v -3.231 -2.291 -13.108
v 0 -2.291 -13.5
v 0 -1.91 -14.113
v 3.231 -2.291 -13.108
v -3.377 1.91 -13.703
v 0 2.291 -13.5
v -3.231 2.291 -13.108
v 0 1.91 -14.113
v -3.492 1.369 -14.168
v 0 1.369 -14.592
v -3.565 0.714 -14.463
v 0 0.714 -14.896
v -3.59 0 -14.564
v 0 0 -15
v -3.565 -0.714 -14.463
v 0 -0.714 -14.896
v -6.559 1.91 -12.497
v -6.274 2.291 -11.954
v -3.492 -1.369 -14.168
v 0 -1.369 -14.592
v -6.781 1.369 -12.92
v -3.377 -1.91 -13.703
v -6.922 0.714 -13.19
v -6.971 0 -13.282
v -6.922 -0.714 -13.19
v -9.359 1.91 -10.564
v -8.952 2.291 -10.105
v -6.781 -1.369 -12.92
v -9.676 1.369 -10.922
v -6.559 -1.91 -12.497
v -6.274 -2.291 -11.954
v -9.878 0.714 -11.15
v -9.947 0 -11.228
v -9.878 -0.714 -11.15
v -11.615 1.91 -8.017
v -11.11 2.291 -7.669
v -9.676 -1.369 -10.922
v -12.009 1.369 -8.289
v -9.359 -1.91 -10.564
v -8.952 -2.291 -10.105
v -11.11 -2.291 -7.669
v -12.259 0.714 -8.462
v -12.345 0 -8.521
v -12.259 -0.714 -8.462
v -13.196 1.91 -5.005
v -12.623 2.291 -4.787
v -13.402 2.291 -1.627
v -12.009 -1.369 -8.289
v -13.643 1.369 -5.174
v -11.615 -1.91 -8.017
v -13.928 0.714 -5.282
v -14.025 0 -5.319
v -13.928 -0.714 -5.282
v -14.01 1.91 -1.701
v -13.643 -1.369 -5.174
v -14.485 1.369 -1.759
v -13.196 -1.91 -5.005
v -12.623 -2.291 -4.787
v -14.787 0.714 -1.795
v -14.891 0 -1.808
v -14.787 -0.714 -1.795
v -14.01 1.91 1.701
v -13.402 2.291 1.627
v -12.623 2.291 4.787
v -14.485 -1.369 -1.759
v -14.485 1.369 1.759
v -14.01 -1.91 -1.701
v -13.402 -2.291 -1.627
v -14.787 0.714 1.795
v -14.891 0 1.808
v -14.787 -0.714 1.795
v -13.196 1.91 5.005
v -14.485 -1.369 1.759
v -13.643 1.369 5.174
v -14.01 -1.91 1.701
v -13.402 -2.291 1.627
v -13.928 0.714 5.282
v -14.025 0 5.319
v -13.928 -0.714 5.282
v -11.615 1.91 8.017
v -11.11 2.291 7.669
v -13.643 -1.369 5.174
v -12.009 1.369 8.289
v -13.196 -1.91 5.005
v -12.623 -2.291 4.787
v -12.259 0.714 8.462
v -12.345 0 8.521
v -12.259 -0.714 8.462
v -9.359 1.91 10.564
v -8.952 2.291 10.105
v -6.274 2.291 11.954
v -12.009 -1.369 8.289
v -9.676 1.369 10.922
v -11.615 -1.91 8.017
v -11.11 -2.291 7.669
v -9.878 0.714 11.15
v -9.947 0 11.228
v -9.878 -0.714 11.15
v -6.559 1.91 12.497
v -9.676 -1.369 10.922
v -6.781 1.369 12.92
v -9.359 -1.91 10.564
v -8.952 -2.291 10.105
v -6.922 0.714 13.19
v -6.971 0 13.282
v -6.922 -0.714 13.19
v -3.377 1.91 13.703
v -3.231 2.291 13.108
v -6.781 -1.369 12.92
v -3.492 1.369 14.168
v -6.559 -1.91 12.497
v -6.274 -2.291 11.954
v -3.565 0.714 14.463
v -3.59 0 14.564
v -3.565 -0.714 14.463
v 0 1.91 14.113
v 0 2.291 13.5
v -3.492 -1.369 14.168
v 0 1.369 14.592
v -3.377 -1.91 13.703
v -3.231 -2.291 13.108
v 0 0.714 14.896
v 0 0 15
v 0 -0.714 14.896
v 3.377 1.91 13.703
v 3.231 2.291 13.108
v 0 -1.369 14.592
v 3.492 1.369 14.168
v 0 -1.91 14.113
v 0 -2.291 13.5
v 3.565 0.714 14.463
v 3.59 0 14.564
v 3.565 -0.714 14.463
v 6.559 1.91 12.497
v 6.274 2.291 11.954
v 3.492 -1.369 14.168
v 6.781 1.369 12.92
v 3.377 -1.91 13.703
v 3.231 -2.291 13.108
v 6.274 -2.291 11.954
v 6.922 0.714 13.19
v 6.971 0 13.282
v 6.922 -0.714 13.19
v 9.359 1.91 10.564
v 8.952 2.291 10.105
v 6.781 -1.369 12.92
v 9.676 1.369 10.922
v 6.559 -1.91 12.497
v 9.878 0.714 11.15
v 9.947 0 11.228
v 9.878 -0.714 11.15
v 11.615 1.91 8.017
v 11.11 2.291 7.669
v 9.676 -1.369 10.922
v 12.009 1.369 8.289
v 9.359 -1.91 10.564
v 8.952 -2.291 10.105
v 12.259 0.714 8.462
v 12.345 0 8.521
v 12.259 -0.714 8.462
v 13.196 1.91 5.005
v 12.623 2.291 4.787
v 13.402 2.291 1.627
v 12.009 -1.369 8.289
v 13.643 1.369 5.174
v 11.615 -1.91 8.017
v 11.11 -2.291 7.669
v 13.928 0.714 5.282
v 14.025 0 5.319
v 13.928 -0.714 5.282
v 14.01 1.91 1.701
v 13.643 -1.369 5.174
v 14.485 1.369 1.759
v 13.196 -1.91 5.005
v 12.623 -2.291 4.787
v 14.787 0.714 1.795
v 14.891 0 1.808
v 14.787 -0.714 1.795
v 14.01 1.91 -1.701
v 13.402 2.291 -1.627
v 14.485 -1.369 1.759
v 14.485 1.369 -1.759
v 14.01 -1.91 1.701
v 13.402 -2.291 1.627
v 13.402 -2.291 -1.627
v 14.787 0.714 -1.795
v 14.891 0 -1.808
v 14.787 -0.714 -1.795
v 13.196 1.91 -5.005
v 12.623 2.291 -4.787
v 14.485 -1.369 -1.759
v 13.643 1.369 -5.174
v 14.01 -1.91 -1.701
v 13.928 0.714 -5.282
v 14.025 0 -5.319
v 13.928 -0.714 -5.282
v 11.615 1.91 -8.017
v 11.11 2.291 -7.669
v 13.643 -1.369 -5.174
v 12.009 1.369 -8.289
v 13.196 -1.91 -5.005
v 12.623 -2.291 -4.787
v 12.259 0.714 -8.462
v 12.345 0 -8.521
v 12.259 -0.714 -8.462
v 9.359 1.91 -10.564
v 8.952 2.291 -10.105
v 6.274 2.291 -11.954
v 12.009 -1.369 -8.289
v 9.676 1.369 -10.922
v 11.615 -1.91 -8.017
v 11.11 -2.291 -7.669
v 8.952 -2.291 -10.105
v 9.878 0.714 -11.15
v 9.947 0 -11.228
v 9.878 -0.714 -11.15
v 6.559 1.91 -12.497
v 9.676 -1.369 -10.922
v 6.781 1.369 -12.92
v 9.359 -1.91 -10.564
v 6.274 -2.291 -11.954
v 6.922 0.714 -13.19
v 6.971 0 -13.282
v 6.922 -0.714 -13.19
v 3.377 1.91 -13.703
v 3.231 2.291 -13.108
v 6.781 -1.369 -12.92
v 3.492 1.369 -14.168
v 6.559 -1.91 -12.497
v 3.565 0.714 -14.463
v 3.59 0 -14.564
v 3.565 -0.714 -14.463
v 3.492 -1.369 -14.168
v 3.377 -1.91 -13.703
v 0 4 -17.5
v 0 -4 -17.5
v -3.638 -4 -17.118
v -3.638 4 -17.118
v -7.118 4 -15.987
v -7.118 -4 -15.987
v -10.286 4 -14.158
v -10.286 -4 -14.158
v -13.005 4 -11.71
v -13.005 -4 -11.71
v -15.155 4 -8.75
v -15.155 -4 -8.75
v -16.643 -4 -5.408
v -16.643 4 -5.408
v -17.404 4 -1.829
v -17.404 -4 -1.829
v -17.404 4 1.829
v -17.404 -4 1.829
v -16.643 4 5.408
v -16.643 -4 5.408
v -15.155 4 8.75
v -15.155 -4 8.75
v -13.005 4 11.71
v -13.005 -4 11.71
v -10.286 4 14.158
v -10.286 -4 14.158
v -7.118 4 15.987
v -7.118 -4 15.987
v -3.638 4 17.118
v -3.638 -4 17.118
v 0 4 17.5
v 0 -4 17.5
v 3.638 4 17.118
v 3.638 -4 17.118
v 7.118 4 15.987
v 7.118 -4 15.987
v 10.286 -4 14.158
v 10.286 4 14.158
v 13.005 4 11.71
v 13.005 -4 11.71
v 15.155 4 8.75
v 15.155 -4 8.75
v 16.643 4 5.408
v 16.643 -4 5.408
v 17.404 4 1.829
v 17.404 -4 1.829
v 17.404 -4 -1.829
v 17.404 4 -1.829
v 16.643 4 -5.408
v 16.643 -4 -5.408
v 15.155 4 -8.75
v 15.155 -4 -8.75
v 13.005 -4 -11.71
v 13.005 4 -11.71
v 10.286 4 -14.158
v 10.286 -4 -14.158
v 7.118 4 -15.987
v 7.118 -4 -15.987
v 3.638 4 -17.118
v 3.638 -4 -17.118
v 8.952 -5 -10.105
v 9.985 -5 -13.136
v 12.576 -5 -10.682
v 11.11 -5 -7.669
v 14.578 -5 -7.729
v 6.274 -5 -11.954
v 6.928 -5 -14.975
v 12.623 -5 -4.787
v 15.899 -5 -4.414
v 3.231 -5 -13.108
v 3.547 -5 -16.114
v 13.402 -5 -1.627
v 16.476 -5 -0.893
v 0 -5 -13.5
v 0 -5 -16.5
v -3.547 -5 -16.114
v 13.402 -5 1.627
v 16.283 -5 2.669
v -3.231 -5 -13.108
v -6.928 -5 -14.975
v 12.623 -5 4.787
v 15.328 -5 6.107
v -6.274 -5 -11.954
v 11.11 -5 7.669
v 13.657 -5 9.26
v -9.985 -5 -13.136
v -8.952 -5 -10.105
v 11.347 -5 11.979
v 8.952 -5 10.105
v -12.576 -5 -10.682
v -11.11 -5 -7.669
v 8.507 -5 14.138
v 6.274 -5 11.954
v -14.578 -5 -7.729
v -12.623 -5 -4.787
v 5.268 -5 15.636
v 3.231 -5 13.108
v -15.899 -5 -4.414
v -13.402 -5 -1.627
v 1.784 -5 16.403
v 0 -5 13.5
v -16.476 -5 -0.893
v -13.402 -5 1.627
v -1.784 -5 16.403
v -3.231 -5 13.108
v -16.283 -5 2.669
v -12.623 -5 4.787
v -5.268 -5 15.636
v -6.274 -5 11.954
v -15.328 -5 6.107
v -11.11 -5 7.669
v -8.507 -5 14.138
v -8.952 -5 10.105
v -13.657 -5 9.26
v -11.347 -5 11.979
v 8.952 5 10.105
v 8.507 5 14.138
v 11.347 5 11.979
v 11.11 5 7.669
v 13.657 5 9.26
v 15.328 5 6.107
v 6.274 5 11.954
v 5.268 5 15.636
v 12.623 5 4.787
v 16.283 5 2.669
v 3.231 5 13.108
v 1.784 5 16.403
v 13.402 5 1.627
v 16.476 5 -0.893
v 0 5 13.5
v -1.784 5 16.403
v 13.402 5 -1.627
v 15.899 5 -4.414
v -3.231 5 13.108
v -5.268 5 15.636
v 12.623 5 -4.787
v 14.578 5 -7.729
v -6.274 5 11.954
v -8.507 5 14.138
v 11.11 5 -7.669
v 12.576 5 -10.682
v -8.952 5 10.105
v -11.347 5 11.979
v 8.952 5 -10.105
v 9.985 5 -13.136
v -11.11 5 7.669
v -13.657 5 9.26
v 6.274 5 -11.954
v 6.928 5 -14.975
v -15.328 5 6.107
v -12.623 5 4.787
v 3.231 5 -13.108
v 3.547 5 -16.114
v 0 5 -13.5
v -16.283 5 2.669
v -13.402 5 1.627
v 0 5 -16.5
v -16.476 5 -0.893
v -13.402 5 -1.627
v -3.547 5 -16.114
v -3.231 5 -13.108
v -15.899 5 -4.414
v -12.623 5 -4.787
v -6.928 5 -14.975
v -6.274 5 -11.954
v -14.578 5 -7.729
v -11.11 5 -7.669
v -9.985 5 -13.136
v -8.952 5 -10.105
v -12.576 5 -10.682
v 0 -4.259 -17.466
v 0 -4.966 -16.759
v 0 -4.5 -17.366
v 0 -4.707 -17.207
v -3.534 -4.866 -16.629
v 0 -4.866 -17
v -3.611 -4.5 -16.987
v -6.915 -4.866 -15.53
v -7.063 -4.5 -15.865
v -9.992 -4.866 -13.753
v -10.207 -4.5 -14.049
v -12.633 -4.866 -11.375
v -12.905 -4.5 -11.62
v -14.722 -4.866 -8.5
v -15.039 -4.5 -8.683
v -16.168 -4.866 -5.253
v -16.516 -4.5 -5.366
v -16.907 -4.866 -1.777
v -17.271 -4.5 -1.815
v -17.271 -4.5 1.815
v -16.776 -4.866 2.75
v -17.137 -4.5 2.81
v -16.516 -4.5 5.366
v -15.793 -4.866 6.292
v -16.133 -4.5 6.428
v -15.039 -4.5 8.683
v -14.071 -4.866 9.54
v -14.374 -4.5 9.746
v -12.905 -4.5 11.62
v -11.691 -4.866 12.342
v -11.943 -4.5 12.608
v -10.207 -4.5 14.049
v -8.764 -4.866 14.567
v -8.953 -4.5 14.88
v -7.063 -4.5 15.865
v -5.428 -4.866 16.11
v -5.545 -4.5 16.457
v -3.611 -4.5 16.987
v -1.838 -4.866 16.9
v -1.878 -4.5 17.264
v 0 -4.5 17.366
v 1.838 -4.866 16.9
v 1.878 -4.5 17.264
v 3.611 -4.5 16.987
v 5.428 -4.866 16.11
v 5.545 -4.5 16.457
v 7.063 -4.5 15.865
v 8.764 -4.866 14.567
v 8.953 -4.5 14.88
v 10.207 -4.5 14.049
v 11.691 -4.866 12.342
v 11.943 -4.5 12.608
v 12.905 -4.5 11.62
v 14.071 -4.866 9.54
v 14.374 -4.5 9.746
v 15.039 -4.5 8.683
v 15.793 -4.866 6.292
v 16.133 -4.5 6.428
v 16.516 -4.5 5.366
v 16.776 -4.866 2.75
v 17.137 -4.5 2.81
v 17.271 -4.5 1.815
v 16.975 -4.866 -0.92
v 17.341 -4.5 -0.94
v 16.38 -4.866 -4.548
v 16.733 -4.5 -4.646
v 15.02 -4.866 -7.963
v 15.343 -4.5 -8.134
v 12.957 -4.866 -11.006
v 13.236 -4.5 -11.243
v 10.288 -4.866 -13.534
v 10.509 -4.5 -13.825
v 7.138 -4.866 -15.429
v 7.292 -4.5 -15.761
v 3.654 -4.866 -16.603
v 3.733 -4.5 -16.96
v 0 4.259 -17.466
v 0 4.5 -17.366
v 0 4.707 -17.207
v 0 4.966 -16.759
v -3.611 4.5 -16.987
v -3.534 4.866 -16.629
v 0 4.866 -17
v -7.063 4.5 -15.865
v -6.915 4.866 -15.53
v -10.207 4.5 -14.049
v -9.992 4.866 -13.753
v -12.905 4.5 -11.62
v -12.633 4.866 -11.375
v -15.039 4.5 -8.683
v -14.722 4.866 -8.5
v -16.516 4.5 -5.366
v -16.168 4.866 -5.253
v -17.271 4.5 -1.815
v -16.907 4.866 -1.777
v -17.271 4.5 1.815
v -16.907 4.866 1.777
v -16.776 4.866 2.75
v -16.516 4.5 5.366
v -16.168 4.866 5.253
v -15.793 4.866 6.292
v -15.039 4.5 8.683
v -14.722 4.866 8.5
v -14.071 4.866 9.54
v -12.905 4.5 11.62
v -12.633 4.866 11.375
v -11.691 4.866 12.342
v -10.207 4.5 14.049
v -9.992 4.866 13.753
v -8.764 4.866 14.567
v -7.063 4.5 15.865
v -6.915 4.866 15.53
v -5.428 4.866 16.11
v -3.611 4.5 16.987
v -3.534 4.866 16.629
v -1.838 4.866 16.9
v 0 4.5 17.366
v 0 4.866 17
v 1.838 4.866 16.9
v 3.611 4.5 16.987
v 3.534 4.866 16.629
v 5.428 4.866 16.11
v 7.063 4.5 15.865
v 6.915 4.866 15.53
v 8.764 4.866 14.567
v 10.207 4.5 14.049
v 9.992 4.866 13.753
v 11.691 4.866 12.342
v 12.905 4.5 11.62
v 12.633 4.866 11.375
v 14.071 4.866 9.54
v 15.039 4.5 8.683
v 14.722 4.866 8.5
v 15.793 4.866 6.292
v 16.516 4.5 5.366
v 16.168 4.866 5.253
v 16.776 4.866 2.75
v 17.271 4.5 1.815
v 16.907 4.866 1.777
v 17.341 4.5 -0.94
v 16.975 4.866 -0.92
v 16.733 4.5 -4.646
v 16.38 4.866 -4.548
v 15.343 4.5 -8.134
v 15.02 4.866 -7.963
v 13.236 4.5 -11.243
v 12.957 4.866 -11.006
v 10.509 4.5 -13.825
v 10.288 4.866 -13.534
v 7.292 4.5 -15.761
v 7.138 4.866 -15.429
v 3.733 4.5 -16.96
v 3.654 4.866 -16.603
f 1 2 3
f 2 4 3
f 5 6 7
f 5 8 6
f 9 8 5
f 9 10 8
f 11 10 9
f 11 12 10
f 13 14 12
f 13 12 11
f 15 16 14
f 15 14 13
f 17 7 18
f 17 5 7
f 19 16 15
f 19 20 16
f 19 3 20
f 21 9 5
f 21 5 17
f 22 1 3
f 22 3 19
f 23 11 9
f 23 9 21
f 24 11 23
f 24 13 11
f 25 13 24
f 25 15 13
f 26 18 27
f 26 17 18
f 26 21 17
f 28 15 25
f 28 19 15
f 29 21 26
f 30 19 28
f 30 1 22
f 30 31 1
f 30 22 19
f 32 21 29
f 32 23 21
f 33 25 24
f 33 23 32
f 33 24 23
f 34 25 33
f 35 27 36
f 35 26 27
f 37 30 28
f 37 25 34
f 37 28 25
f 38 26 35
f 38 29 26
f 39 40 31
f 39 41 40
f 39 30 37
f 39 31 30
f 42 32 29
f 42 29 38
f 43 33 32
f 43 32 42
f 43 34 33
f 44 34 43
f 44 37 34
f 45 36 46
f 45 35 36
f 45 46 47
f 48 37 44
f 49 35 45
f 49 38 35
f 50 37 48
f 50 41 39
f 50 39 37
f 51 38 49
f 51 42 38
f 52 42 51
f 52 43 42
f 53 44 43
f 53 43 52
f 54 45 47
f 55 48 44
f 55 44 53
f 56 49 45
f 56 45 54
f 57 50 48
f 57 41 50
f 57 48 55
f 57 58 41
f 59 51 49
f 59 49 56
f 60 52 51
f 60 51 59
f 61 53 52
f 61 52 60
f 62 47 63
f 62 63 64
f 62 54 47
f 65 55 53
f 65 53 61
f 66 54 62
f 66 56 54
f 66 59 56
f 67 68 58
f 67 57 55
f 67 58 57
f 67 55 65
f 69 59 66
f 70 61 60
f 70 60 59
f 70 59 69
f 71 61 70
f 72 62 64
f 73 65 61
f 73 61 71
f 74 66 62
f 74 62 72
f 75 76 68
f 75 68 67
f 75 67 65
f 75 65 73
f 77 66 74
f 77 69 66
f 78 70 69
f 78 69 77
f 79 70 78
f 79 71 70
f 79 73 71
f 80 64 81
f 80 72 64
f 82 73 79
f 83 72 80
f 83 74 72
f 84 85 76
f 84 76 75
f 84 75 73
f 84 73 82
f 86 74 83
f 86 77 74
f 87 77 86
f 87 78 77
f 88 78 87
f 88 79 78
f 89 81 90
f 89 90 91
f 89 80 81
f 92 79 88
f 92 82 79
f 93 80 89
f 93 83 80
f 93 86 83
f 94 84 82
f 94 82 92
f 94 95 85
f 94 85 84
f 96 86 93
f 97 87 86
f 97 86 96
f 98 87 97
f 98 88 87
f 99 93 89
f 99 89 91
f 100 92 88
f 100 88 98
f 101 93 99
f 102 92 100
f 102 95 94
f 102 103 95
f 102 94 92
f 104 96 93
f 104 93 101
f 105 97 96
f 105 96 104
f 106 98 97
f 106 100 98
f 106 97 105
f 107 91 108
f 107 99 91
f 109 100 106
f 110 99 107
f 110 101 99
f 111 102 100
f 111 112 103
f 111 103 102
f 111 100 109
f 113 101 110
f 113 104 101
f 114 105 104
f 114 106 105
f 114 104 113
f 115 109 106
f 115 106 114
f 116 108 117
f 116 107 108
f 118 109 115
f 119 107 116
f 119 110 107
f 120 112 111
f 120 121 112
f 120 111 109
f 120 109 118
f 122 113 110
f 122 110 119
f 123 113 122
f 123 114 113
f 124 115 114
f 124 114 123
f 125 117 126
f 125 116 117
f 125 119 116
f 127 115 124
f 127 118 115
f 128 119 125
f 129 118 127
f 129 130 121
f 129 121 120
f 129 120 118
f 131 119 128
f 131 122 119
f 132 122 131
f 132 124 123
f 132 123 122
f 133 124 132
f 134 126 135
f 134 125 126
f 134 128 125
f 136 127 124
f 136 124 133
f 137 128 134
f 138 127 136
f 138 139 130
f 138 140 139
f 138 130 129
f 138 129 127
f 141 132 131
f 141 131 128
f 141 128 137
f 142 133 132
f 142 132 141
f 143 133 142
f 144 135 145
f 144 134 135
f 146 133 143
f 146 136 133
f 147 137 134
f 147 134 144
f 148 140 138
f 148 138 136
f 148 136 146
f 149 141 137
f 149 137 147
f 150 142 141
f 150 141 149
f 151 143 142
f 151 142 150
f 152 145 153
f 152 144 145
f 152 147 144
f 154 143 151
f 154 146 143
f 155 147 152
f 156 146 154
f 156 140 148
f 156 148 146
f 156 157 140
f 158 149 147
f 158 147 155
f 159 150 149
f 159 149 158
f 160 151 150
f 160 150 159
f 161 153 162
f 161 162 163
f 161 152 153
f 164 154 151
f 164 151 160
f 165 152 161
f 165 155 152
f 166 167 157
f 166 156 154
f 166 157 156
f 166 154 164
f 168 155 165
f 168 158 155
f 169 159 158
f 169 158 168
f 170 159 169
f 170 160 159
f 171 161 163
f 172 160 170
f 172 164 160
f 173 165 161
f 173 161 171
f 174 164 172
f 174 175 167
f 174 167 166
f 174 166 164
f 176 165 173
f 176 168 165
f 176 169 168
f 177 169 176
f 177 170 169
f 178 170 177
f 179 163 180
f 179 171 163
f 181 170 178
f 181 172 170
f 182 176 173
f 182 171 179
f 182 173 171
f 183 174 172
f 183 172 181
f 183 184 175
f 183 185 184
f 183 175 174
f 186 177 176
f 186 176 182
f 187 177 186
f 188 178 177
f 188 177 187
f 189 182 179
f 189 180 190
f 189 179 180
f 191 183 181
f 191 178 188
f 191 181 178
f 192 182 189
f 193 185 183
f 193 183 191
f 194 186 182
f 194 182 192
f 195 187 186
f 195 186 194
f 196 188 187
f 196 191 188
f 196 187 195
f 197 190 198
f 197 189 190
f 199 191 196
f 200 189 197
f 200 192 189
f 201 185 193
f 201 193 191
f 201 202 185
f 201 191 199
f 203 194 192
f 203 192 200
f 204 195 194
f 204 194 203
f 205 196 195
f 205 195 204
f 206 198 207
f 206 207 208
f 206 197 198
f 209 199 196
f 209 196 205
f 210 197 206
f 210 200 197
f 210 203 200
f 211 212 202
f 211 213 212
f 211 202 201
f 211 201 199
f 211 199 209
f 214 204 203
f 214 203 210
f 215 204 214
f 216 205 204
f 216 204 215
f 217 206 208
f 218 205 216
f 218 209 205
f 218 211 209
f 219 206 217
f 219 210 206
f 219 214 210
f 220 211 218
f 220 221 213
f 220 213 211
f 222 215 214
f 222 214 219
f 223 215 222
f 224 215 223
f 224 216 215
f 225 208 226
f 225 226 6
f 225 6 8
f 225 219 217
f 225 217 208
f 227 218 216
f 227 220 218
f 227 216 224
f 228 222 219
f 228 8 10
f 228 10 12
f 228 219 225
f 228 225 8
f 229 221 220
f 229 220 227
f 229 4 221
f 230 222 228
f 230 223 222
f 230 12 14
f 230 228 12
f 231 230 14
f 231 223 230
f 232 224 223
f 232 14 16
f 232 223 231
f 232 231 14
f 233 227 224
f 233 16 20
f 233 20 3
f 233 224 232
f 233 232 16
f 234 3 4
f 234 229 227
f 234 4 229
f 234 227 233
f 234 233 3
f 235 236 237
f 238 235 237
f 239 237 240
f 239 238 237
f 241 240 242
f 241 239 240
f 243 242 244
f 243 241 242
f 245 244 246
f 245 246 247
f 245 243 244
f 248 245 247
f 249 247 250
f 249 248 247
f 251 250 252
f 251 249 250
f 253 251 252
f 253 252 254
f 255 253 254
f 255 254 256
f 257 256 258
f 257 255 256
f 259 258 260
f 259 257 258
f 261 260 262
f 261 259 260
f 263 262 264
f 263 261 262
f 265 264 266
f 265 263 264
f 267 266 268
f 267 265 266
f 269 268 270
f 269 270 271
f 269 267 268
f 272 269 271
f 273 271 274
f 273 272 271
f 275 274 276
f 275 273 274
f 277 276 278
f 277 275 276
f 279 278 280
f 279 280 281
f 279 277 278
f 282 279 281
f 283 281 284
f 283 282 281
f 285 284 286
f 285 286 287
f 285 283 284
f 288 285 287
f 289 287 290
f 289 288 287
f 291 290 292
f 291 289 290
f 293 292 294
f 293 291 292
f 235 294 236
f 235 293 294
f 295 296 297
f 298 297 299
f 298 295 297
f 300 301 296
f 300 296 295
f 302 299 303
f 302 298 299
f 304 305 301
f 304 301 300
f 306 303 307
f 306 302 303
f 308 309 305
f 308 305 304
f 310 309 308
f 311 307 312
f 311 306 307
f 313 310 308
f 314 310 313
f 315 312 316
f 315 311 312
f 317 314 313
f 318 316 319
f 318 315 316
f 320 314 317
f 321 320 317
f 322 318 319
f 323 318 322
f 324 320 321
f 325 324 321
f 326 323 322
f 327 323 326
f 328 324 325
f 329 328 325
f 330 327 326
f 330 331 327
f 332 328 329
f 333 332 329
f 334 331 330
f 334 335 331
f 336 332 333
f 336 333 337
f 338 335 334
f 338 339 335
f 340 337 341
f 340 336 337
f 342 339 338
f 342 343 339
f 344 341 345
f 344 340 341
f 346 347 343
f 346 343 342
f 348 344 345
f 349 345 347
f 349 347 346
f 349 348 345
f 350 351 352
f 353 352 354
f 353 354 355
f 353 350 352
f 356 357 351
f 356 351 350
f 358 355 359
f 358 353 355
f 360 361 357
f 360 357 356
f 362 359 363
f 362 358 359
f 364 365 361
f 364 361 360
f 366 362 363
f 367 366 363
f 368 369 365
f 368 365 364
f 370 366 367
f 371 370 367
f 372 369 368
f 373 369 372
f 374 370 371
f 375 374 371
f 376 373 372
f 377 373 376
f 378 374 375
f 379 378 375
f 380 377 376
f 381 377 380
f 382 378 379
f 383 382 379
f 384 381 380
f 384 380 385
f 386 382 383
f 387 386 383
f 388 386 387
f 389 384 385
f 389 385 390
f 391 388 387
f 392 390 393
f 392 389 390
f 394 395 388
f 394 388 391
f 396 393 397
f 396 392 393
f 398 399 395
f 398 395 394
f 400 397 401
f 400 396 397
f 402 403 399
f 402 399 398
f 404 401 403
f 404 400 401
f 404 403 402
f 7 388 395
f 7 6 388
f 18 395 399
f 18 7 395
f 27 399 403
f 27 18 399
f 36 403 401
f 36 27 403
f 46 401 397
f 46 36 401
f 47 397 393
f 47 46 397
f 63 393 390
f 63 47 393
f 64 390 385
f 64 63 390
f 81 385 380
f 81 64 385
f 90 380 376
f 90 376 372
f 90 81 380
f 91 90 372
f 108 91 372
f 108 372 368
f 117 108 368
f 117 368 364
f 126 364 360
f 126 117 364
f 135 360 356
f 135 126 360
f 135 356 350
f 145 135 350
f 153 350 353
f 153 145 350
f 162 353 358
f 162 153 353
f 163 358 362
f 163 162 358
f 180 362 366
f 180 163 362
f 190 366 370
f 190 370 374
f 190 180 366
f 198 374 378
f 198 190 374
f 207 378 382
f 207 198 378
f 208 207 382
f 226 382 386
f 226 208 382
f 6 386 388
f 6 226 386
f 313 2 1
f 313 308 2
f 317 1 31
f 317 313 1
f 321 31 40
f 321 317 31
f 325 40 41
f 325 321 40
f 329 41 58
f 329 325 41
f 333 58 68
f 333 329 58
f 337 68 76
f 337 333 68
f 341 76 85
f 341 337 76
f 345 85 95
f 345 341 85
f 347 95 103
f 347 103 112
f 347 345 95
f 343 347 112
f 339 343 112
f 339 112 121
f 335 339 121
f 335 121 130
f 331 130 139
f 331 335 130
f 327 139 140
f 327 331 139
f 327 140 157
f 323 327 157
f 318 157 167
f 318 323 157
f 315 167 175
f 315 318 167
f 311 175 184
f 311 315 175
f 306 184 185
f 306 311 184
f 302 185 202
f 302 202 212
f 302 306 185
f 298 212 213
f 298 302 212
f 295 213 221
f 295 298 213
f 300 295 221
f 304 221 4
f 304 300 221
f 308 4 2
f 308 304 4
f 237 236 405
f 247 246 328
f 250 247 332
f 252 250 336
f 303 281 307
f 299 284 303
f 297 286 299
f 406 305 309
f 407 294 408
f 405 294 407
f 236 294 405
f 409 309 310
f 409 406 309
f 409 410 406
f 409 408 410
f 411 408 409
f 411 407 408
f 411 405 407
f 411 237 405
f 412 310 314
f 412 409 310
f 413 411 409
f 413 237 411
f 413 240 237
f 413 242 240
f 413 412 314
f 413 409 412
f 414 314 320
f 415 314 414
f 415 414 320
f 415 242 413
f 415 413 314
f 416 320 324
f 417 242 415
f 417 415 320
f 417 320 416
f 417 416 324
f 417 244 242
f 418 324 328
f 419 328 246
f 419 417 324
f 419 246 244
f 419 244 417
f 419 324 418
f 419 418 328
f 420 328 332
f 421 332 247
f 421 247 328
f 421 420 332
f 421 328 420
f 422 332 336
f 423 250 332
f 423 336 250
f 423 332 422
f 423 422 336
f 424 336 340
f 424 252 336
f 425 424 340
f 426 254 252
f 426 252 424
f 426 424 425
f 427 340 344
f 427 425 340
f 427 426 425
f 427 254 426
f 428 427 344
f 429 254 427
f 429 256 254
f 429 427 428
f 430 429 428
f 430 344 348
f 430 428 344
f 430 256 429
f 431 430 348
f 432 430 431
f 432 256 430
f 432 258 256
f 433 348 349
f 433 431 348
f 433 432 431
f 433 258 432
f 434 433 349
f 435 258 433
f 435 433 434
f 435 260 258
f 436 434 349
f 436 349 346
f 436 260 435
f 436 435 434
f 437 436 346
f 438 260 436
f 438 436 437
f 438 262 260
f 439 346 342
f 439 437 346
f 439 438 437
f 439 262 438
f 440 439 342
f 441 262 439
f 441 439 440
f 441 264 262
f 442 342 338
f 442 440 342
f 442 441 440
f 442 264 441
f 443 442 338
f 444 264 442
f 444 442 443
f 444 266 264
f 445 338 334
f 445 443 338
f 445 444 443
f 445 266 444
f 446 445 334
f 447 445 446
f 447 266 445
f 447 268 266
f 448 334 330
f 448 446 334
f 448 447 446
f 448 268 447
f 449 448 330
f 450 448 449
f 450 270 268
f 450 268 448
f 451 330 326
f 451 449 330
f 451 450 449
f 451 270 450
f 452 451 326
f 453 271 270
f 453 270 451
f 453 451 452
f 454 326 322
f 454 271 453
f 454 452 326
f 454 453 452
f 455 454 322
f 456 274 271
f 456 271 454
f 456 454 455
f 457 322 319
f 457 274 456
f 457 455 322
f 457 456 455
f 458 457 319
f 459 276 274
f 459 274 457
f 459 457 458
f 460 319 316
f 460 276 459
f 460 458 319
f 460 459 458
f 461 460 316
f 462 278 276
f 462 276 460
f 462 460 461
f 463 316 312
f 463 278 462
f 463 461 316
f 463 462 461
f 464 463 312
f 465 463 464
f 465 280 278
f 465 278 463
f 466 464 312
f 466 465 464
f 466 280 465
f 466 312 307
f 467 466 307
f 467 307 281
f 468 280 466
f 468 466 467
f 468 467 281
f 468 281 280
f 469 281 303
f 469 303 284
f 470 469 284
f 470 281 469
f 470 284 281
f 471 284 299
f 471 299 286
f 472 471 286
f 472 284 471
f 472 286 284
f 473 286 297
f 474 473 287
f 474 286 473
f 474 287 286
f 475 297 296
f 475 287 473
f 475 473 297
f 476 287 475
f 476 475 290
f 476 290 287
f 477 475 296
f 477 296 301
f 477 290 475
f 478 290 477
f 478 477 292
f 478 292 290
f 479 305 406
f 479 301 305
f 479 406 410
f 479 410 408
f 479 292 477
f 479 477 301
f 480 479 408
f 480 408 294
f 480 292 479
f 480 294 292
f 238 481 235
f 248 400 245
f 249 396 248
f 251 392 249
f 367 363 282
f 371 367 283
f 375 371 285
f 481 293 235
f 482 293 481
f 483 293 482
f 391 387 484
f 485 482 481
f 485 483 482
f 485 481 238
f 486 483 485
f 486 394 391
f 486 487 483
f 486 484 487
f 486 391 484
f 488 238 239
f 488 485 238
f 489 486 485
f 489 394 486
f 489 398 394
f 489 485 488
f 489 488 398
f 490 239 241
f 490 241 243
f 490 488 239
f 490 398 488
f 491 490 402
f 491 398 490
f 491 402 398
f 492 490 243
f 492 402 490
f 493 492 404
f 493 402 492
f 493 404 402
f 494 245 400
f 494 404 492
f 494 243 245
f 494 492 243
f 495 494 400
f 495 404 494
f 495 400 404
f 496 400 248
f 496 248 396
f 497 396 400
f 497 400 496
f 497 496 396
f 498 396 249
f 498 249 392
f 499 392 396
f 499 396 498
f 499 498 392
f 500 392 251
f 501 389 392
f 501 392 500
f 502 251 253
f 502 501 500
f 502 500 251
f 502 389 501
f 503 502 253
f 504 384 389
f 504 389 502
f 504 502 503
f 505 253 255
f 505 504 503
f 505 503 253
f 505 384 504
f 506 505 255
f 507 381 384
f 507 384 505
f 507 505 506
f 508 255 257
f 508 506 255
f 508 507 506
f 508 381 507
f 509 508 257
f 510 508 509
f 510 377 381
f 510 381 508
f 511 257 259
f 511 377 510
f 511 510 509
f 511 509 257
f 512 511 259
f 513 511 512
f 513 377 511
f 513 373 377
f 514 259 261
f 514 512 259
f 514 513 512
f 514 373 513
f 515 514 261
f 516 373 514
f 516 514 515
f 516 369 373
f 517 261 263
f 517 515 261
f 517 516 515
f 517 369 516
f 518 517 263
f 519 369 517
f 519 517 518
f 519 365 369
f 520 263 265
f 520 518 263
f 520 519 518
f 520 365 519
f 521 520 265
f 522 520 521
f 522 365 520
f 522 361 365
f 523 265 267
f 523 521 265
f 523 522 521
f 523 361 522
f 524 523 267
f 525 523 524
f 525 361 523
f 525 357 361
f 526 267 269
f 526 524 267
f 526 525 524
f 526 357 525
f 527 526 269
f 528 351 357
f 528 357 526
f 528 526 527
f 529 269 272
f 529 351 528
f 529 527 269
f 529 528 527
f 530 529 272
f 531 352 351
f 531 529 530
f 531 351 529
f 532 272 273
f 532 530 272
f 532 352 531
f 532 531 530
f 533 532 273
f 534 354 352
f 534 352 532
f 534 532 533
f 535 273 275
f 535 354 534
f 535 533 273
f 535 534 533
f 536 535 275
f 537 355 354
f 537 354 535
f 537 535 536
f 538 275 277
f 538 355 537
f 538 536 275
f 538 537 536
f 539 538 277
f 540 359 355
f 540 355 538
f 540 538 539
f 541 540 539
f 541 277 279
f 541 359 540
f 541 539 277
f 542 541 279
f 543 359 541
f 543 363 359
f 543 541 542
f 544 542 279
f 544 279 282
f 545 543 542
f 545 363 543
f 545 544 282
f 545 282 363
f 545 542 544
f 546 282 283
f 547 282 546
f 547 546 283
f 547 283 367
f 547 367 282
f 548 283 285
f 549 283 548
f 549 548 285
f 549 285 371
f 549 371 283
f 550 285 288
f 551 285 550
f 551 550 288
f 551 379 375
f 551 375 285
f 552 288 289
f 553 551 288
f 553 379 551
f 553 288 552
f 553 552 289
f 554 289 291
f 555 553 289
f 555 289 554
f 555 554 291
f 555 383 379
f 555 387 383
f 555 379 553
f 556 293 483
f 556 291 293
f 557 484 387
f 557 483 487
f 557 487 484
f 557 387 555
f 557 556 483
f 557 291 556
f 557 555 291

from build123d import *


with BuildPart() as part:
    # Sketch1 → Revolve1 (revolve)
    with BuildSketch(Plane.YZ, mode=Mode.PRIVATE) as revolve1_sk:
        with BuildLine():
            Line((-4, 17.5), (4, 17.5))
            ThreePointArc((4, 17.5), (4.707106781, 17.207106781), (5, 16.5))
            Line((5, 16.5), (5, 13.5))
            Line((5, 13.5), (2.291287847, 13.5))
            ThreePointArc((2.291287847, 13.5), (0, 15), (-2.291287847, 13.5))
            Line((-2.291287847, 13.5), (-5, 13.5))
            Line((-5, 13.5), (-5, 16.5))
            ThreePointArc((-5, 16.5), (-4.707106781, 17.207106781), (-4, 17.5))
        make_face()
    revolve(revolve1_sk.sketch.rotate(Axis((0, -30.435284328, 0), (0, 1, 0)), 180), axis=Axis((0, -30.435284328, 0), (0, 1, 0)))


solid = part.part
